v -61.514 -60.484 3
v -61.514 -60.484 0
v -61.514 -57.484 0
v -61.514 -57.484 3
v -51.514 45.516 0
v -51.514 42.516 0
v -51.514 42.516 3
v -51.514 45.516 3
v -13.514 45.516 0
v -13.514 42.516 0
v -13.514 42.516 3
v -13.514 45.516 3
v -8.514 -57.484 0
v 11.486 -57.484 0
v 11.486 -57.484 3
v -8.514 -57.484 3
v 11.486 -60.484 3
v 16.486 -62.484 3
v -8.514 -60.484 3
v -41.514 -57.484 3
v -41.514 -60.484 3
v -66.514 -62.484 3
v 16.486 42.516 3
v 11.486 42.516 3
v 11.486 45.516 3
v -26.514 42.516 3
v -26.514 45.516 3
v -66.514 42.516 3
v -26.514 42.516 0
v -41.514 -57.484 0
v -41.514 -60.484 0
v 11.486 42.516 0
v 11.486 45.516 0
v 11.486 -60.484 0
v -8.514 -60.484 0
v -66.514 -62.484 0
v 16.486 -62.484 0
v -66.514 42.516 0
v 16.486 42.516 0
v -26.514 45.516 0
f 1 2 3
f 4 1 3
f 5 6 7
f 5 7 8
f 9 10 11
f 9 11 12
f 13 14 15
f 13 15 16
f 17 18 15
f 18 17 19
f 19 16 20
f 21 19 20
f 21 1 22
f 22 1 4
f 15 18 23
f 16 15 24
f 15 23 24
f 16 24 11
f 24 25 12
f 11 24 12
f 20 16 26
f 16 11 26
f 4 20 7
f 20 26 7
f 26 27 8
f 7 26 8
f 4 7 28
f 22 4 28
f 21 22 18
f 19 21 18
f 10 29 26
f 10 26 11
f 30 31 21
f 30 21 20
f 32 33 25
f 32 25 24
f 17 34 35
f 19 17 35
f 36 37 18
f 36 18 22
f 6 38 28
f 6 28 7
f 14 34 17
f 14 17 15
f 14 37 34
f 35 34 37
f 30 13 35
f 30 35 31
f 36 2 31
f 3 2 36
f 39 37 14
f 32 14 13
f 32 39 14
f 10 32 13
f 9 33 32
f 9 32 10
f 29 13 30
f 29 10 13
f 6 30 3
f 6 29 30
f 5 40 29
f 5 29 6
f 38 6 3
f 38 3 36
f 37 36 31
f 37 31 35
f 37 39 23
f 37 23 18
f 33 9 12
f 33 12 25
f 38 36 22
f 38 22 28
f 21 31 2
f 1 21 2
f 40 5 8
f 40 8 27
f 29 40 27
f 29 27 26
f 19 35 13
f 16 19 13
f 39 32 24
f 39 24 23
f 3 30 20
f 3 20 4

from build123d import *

# Parameters (mm, degrees)
RESSALTO_EXTRUS_O1_DEPTH = 3
ESBO_O2_W                = 20
ESBO_O2_H                = 3
CORTE_EXTRUS_O1_DEPTH    = 4


with BuildPart() as part:
    # Esboço1 → Ressalto-extrusão1 (new body)
    with BuildSketch(Plane.XY):
        Polygon((-26.514068493, 42.51552795), (-13.514068493, 42.51552795), (-13.514068493, 45.51552795), (11.485931507, 45.51552795), (11.485931507, 42.51552795), (16.485931507, 42.51552795), (16.485931507, -62.48447205), (-66.514068493, -62.48447205), (-66.514068493, 42.51552795), (-51.514068493, 42.51552795), (-51.514068493, 45.51552795), (-26.514068493, 45.51552795), align=None)
    extrude(amount=RESSALTO_EXTRUS_O1_DEPTH)

    # Esboço2 → Corte-extrusão1 (cut, through all)
    with BuildSketch(Plane(origin=(0, 0, 0), x_dir=(-1, 0, 0), z_dir=(0, 0, -1))):
        with Locations((51.514068493, -58.98447205)):
            Rectangle(ESBO_O2_W, ESBO_O2_H)
        with Locations((-1.485931507, -58.98447205)):
            Rectangle(ESBO_O2_W, ESBO_O2_H)
    extrude(amount=-CORTE_EXTRUS_O1_DEPTH, mode=Mode.SUBTRACT)


solid = part.part
